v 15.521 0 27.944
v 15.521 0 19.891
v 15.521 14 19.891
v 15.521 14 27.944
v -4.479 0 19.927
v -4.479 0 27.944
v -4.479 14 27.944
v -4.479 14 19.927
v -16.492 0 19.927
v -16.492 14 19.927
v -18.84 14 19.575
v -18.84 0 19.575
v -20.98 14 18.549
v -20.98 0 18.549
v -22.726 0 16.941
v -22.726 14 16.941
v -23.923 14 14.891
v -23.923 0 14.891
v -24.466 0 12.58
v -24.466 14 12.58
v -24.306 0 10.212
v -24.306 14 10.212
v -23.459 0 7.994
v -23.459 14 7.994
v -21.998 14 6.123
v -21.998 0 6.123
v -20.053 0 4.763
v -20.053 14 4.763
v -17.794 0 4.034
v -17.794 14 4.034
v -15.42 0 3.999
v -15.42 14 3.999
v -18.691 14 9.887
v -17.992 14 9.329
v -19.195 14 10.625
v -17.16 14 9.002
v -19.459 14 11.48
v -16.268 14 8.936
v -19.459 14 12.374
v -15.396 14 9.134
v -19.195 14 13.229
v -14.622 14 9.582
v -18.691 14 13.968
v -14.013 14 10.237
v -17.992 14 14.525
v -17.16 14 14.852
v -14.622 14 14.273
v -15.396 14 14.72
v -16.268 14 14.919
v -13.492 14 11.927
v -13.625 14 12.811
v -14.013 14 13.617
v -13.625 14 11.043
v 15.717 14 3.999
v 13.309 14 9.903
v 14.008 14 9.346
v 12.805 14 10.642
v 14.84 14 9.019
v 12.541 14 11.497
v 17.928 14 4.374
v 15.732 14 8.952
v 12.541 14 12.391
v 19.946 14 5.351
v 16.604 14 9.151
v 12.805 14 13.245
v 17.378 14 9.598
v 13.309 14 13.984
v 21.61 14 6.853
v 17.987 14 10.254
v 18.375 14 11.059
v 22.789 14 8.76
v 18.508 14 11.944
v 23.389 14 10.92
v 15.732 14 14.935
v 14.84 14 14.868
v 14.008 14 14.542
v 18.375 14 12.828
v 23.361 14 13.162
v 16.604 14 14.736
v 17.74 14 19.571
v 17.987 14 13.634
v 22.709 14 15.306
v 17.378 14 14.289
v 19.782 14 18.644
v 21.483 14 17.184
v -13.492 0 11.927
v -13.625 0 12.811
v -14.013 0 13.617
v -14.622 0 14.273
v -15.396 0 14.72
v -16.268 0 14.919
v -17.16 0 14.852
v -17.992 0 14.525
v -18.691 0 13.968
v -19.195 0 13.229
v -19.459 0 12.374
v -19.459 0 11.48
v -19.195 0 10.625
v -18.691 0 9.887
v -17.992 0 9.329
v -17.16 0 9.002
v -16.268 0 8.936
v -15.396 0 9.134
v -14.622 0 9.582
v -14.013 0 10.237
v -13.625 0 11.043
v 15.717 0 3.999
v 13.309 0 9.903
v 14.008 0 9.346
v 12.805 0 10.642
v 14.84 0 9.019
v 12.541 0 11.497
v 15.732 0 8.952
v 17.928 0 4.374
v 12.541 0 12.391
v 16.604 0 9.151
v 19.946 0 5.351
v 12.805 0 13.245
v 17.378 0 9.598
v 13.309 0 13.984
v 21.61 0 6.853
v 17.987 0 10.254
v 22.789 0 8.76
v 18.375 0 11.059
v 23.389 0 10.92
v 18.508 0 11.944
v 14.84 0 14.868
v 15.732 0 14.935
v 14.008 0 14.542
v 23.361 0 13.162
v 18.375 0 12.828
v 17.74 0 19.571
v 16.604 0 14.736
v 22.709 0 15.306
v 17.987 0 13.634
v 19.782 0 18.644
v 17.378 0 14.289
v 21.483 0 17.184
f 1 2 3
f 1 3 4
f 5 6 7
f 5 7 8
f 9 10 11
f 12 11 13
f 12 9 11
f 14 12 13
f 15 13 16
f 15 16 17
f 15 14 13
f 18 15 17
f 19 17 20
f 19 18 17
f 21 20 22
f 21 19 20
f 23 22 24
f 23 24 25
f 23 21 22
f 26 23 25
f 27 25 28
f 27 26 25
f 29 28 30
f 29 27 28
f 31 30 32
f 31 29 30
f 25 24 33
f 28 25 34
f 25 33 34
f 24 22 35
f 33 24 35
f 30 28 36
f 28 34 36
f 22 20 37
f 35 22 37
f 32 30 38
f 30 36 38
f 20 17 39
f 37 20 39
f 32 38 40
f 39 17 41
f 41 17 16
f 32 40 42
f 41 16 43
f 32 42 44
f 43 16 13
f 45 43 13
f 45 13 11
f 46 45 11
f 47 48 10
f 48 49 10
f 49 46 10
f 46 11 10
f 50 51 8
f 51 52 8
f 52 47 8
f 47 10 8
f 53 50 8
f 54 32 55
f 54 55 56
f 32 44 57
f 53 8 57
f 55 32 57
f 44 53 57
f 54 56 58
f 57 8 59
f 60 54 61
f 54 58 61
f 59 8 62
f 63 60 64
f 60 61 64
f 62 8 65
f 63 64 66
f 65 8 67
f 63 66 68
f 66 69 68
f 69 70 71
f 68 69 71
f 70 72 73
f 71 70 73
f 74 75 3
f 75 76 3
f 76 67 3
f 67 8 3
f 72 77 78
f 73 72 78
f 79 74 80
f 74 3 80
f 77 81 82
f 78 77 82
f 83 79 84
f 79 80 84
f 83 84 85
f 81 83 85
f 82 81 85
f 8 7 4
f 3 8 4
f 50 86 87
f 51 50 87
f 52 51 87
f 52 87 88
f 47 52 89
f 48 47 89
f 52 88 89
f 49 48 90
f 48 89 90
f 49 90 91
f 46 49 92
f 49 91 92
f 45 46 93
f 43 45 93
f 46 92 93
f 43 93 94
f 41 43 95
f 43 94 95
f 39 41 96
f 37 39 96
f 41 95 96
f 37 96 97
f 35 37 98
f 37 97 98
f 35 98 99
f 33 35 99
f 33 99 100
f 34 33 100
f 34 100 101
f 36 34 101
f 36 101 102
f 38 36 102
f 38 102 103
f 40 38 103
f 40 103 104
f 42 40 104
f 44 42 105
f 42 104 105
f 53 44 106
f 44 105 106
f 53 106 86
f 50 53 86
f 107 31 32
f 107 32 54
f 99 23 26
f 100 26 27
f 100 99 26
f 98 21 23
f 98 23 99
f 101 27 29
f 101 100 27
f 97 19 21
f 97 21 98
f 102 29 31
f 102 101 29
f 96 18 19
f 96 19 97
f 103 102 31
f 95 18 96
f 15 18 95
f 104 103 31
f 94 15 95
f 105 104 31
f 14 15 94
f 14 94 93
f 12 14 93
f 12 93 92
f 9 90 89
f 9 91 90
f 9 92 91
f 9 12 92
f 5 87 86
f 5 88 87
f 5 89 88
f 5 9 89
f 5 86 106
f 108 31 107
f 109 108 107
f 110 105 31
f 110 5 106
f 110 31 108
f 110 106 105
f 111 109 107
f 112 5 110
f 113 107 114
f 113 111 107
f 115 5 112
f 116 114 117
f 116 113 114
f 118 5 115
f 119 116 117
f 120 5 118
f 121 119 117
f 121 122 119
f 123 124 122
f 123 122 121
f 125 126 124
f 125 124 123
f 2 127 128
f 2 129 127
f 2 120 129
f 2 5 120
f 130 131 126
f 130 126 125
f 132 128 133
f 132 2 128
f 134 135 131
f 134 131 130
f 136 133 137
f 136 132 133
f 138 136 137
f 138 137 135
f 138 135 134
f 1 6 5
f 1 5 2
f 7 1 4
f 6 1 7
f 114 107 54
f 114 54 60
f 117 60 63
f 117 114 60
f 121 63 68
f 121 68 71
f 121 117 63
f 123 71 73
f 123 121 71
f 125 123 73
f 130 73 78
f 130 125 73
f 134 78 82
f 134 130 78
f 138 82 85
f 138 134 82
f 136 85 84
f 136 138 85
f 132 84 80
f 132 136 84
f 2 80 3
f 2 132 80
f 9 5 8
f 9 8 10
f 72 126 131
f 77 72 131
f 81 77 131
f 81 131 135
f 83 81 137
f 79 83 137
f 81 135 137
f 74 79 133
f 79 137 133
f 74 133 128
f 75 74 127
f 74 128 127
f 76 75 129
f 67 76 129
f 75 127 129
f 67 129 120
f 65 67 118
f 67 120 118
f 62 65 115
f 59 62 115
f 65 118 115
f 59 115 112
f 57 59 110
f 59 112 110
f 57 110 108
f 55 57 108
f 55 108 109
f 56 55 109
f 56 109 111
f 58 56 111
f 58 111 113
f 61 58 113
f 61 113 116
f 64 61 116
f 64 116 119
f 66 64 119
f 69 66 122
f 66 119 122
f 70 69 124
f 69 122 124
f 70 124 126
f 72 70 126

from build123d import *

# Parameters (mm, degrees)
F0_R     = 3
F1_DEPTH = 14


with BuildPart() as f1:
    # F0 (on Front) → F1 (new body)
    with BuildSketch(Plane.XZ):
        with BuildLine():
            ThreePointArc((-16.492189, 19.927121), (-24.474129, 11.389875), (-15.420123, 3.999279))
            Line((-15.420123, 3.999279), (15.717345, 3.999279))
            ThreePointArc((15.717345, 3.999279), (23.454399, 12.041669), (15.521441, 19.890888))
            Line((15.521441, 19.890888), (15.521441, 27.943708))
            Line((15.521441, 27.943708), (-4.478559, 27.943708))
            Line((-4.478559, 27.943708), (-4.478559, 19.927121))
            Line((-4.478559, 19.927121), (-16.492189, 19.927121))
        make_face()
        with Locations((-16.492189, 11.927121)):
            Circle(F0_R, mode=Mode.SUBTRACT)
        with Locations((15.507811, 11.943708)):
            Circle(F0_R, mode=Mode.SUBTRACT)
    extrude(amount=-F1_DEPTH)


solid = f1.part
